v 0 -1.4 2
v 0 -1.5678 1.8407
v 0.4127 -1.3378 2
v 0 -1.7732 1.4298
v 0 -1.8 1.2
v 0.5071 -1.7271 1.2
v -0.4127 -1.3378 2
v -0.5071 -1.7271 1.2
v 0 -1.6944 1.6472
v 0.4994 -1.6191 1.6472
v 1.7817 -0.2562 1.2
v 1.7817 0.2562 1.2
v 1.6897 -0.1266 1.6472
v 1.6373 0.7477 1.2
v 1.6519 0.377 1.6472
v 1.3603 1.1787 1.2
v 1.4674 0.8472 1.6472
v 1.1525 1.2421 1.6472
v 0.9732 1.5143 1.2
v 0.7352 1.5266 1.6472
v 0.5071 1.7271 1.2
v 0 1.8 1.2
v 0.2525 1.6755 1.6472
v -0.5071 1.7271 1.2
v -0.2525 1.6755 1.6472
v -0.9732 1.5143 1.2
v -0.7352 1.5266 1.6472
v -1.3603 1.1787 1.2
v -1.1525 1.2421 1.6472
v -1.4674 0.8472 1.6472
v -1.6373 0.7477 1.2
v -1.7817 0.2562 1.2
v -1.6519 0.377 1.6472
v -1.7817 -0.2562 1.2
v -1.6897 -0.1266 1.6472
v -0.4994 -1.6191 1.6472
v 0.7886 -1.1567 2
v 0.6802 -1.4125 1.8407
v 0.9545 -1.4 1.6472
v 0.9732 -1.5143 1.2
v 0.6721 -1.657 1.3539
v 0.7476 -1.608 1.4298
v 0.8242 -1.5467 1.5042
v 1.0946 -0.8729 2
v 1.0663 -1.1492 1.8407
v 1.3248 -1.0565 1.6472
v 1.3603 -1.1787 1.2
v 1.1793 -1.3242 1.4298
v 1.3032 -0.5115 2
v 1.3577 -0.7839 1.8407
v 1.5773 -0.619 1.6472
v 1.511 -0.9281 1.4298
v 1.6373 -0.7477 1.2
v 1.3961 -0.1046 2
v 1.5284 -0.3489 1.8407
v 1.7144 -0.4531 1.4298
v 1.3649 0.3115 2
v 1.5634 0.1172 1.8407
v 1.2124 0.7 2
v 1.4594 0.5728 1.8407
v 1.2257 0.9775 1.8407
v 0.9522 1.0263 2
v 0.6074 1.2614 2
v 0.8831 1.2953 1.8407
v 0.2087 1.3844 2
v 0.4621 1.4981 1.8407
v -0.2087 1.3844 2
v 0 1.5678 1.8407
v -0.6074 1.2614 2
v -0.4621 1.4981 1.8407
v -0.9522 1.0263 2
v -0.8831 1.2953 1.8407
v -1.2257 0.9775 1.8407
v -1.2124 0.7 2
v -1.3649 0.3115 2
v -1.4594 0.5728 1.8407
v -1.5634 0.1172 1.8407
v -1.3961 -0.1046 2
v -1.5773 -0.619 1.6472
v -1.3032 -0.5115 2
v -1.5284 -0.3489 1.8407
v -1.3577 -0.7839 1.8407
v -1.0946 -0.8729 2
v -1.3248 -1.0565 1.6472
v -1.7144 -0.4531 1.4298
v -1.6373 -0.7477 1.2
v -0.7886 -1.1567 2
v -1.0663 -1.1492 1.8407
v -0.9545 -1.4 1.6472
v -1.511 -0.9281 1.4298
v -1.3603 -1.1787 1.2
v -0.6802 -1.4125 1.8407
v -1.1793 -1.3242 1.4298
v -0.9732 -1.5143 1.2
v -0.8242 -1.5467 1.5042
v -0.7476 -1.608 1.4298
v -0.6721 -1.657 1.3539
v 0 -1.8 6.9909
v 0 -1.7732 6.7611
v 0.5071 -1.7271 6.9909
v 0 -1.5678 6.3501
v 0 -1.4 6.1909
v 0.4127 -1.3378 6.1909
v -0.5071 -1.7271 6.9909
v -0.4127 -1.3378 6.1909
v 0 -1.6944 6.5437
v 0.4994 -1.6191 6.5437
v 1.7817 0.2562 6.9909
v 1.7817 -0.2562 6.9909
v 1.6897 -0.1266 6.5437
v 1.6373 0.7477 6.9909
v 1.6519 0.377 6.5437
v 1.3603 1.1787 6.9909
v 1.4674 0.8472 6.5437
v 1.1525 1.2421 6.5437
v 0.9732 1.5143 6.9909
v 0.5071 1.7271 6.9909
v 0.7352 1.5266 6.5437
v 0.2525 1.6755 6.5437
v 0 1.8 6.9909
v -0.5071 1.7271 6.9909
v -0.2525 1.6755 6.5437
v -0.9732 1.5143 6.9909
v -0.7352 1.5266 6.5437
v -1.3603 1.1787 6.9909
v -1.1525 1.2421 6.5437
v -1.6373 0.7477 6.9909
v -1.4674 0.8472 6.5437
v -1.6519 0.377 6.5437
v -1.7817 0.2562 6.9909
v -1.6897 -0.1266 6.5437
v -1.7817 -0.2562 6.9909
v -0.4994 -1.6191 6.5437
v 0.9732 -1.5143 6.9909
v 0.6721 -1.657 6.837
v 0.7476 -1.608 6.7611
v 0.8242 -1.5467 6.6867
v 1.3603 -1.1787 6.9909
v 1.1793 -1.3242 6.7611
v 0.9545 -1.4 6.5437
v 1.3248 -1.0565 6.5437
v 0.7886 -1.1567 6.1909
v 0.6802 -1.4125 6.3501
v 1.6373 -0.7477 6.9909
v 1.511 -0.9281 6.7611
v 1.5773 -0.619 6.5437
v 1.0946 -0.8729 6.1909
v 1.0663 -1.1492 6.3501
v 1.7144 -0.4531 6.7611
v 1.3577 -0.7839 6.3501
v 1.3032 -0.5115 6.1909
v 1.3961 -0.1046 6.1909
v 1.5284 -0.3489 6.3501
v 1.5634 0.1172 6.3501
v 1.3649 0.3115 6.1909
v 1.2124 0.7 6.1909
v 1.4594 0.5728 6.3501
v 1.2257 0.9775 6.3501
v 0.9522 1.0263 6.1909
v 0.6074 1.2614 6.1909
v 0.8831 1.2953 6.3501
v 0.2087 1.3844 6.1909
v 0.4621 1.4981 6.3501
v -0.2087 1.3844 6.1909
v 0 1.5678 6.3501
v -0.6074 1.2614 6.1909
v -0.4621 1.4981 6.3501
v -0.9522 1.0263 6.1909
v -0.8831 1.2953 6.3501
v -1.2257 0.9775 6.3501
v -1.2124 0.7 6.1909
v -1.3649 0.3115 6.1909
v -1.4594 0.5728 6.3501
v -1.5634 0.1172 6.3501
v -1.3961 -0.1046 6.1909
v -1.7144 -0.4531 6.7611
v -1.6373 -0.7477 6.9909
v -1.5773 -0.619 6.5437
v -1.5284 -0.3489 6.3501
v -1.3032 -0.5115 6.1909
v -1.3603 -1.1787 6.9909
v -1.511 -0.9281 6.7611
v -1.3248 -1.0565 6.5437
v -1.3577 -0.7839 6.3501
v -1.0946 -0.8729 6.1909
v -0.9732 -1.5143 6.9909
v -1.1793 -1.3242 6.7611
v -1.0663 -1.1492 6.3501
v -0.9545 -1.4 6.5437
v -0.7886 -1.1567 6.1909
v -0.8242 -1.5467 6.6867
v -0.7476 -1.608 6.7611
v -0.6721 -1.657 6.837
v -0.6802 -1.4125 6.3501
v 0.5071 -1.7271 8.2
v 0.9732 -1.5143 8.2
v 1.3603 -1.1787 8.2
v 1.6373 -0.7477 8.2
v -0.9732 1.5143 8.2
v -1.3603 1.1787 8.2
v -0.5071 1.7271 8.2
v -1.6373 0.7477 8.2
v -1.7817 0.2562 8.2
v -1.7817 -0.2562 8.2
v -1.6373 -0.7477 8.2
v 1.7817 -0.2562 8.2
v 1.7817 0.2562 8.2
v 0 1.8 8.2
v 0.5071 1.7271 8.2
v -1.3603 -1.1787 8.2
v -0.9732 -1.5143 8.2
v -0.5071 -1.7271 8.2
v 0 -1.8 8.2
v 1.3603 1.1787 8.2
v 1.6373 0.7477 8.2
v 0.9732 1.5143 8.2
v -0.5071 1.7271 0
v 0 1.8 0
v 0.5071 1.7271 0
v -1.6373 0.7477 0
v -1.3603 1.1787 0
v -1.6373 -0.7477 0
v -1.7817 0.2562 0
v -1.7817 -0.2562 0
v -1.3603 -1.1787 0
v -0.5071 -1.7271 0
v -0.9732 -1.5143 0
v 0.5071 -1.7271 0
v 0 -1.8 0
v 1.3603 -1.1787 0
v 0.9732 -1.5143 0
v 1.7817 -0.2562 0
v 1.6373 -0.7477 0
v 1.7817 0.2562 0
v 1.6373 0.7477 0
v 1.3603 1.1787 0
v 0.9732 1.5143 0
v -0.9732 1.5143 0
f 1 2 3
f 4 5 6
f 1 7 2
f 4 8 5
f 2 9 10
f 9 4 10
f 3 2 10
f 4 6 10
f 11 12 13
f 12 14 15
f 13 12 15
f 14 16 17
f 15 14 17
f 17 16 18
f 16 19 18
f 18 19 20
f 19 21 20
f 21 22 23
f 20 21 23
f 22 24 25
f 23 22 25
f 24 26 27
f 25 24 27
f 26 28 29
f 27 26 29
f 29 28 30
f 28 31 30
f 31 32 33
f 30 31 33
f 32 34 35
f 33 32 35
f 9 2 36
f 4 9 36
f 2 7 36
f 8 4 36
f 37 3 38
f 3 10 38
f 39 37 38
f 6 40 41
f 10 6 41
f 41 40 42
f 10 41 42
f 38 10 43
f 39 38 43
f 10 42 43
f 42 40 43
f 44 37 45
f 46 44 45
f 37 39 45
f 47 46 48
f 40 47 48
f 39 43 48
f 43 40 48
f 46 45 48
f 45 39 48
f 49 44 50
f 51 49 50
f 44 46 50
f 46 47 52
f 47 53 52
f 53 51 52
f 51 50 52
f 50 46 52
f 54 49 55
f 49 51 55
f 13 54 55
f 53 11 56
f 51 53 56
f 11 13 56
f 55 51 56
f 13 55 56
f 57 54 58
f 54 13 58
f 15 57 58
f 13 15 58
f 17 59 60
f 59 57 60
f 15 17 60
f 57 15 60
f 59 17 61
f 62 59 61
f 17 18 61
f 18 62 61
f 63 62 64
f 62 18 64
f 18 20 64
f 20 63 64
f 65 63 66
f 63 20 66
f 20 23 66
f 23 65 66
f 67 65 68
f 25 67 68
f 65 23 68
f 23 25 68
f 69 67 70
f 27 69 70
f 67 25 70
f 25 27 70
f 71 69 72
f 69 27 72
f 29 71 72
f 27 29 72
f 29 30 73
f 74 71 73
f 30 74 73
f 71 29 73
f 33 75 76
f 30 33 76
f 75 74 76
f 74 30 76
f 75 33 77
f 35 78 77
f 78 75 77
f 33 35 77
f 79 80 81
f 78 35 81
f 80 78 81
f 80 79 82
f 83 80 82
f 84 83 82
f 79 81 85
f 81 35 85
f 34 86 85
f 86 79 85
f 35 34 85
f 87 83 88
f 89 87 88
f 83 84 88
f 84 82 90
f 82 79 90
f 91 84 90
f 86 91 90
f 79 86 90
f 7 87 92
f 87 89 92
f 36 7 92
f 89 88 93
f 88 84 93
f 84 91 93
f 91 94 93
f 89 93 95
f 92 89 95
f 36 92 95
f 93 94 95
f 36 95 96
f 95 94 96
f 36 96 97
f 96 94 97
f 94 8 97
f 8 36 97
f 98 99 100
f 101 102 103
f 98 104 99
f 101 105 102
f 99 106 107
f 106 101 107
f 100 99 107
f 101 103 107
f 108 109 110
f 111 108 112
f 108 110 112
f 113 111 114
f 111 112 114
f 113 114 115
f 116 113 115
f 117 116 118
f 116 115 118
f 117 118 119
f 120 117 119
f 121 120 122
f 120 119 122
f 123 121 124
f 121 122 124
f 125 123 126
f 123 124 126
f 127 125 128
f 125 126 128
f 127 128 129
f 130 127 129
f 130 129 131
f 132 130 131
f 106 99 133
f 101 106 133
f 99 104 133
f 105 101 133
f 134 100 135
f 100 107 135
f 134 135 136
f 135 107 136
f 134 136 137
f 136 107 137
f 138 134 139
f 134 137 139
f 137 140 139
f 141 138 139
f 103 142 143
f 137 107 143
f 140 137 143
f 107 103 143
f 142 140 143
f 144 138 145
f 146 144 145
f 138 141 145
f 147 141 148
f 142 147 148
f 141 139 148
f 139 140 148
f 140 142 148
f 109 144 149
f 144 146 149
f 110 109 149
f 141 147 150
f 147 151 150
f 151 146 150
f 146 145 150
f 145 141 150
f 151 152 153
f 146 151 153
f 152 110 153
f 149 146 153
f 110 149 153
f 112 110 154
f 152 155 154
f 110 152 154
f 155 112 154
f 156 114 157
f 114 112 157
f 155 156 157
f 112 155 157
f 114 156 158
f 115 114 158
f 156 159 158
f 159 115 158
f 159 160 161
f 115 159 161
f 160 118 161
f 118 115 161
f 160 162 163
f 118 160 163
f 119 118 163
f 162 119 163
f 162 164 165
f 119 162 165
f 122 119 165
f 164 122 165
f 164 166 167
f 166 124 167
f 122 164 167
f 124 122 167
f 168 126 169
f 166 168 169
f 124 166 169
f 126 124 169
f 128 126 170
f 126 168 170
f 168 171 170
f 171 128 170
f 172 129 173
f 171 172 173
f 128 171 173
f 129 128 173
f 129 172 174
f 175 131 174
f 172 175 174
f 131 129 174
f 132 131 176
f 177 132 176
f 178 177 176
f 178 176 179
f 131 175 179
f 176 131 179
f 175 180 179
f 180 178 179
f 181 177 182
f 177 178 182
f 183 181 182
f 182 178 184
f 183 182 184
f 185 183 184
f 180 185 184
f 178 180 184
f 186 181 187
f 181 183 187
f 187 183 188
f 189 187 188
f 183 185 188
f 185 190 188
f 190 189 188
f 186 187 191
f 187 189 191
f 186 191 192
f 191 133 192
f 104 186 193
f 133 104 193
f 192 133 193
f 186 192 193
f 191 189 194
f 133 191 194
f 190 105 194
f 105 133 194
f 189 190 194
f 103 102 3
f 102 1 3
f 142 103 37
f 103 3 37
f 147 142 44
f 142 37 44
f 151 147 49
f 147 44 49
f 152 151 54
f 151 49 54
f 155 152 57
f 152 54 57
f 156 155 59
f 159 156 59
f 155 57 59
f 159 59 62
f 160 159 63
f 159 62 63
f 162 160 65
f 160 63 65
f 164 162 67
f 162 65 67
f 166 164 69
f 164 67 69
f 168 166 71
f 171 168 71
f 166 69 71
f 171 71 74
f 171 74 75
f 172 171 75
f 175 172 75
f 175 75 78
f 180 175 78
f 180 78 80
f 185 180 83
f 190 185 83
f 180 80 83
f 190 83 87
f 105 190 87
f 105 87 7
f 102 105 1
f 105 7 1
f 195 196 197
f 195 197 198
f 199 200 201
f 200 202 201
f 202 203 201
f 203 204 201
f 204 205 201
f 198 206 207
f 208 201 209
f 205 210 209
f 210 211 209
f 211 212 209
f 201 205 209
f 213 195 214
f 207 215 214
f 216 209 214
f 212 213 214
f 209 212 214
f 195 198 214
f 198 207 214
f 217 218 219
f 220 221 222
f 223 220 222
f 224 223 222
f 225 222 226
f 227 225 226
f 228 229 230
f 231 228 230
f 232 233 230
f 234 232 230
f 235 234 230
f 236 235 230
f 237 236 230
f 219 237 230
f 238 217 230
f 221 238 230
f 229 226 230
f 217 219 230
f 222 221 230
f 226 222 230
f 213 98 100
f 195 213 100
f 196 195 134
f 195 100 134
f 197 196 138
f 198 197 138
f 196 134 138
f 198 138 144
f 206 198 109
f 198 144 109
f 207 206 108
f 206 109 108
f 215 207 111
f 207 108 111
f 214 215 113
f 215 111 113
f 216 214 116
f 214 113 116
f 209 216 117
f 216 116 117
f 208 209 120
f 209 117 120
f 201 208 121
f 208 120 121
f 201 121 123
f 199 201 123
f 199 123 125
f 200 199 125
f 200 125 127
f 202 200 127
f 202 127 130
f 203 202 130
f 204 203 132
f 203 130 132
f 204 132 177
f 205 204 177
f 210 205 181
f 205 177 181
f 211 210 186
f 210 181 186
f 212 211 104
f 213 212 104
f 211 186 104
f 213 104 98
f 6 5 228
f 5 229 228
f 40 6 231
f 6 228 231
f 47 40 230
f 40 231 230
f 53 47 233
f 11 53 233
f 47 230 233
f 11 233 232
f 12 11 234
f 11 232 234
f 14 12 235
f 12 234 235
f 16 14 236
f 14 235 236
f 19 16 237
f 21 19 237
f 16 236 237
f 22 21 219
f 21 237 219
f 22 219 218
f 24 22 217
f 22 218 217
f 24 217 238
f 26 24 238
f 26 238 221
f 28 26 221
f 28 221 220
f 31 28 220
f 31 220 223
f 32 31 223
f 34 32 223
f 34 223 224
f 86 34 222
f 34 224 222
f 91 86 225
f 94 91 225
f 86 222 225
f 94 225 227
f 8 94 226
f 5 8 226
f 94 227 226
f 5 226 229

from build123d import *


# Not quite as in the source:
# - a fillet or chamfer that OpenCascade refuses, or shapes differently, is made with other operations: its cross-section is extruded or revolved along the edge and cut away or added


with BuildPart() as f1:
    # F0 (on Right) → F1 (revolve)
    with BuildSketch(Plane.YZ):
        Polygon((-1.8, 0), (0, 0), (0, 8.2), (-1.8, 8.2), (-1.8, 6.2), (-1.4, 6.1908951029), (-1.4, 2), (-1.8, 2), align=None)
    revolve(axis=Axis((0, 0, 4.1), (0, 0, 1)))

    # F2: fillet of radius 1 on 2 edges, made by hand

    # F2_s1 → F2_t2 (revolve, cut)
    with BuildSketch(Plane.YZ):
        with BuildLine():
            ThreePointArc((-1.8, 6.9908951029), (-1.694427191, 6.5436815074), (-1.4, 6.1908951029))
            Line((-1.4, 6.1908951029), (-1.8, 6.2))
            Line((-1.8, 6.2), (-1.8, 6.9908951029))
        make_face()
    revolve(axis=Axis((0, 0, 6.2), (0, 0, 1)), mode=Mode.SUBTRACT)

    # F2_s3 → F2_t4 (revolve, cut)
    with BuildSketch(Plane.YZ):
        with BuildLine():
            ThreePointArc((-1.4, 2), (-1.694427191, 1.6472135955), (-1.8, 1.2))
            Line((-1.8, 1.2), (-1.8, 2))
            Line((-1.8, 2), (-1.4, 2))
        make_face()
    revolve(axis=Axis((0, 0, 2), (0, 0, 1)), mode=Mode.SUBTRACT)


solid = f1.part
